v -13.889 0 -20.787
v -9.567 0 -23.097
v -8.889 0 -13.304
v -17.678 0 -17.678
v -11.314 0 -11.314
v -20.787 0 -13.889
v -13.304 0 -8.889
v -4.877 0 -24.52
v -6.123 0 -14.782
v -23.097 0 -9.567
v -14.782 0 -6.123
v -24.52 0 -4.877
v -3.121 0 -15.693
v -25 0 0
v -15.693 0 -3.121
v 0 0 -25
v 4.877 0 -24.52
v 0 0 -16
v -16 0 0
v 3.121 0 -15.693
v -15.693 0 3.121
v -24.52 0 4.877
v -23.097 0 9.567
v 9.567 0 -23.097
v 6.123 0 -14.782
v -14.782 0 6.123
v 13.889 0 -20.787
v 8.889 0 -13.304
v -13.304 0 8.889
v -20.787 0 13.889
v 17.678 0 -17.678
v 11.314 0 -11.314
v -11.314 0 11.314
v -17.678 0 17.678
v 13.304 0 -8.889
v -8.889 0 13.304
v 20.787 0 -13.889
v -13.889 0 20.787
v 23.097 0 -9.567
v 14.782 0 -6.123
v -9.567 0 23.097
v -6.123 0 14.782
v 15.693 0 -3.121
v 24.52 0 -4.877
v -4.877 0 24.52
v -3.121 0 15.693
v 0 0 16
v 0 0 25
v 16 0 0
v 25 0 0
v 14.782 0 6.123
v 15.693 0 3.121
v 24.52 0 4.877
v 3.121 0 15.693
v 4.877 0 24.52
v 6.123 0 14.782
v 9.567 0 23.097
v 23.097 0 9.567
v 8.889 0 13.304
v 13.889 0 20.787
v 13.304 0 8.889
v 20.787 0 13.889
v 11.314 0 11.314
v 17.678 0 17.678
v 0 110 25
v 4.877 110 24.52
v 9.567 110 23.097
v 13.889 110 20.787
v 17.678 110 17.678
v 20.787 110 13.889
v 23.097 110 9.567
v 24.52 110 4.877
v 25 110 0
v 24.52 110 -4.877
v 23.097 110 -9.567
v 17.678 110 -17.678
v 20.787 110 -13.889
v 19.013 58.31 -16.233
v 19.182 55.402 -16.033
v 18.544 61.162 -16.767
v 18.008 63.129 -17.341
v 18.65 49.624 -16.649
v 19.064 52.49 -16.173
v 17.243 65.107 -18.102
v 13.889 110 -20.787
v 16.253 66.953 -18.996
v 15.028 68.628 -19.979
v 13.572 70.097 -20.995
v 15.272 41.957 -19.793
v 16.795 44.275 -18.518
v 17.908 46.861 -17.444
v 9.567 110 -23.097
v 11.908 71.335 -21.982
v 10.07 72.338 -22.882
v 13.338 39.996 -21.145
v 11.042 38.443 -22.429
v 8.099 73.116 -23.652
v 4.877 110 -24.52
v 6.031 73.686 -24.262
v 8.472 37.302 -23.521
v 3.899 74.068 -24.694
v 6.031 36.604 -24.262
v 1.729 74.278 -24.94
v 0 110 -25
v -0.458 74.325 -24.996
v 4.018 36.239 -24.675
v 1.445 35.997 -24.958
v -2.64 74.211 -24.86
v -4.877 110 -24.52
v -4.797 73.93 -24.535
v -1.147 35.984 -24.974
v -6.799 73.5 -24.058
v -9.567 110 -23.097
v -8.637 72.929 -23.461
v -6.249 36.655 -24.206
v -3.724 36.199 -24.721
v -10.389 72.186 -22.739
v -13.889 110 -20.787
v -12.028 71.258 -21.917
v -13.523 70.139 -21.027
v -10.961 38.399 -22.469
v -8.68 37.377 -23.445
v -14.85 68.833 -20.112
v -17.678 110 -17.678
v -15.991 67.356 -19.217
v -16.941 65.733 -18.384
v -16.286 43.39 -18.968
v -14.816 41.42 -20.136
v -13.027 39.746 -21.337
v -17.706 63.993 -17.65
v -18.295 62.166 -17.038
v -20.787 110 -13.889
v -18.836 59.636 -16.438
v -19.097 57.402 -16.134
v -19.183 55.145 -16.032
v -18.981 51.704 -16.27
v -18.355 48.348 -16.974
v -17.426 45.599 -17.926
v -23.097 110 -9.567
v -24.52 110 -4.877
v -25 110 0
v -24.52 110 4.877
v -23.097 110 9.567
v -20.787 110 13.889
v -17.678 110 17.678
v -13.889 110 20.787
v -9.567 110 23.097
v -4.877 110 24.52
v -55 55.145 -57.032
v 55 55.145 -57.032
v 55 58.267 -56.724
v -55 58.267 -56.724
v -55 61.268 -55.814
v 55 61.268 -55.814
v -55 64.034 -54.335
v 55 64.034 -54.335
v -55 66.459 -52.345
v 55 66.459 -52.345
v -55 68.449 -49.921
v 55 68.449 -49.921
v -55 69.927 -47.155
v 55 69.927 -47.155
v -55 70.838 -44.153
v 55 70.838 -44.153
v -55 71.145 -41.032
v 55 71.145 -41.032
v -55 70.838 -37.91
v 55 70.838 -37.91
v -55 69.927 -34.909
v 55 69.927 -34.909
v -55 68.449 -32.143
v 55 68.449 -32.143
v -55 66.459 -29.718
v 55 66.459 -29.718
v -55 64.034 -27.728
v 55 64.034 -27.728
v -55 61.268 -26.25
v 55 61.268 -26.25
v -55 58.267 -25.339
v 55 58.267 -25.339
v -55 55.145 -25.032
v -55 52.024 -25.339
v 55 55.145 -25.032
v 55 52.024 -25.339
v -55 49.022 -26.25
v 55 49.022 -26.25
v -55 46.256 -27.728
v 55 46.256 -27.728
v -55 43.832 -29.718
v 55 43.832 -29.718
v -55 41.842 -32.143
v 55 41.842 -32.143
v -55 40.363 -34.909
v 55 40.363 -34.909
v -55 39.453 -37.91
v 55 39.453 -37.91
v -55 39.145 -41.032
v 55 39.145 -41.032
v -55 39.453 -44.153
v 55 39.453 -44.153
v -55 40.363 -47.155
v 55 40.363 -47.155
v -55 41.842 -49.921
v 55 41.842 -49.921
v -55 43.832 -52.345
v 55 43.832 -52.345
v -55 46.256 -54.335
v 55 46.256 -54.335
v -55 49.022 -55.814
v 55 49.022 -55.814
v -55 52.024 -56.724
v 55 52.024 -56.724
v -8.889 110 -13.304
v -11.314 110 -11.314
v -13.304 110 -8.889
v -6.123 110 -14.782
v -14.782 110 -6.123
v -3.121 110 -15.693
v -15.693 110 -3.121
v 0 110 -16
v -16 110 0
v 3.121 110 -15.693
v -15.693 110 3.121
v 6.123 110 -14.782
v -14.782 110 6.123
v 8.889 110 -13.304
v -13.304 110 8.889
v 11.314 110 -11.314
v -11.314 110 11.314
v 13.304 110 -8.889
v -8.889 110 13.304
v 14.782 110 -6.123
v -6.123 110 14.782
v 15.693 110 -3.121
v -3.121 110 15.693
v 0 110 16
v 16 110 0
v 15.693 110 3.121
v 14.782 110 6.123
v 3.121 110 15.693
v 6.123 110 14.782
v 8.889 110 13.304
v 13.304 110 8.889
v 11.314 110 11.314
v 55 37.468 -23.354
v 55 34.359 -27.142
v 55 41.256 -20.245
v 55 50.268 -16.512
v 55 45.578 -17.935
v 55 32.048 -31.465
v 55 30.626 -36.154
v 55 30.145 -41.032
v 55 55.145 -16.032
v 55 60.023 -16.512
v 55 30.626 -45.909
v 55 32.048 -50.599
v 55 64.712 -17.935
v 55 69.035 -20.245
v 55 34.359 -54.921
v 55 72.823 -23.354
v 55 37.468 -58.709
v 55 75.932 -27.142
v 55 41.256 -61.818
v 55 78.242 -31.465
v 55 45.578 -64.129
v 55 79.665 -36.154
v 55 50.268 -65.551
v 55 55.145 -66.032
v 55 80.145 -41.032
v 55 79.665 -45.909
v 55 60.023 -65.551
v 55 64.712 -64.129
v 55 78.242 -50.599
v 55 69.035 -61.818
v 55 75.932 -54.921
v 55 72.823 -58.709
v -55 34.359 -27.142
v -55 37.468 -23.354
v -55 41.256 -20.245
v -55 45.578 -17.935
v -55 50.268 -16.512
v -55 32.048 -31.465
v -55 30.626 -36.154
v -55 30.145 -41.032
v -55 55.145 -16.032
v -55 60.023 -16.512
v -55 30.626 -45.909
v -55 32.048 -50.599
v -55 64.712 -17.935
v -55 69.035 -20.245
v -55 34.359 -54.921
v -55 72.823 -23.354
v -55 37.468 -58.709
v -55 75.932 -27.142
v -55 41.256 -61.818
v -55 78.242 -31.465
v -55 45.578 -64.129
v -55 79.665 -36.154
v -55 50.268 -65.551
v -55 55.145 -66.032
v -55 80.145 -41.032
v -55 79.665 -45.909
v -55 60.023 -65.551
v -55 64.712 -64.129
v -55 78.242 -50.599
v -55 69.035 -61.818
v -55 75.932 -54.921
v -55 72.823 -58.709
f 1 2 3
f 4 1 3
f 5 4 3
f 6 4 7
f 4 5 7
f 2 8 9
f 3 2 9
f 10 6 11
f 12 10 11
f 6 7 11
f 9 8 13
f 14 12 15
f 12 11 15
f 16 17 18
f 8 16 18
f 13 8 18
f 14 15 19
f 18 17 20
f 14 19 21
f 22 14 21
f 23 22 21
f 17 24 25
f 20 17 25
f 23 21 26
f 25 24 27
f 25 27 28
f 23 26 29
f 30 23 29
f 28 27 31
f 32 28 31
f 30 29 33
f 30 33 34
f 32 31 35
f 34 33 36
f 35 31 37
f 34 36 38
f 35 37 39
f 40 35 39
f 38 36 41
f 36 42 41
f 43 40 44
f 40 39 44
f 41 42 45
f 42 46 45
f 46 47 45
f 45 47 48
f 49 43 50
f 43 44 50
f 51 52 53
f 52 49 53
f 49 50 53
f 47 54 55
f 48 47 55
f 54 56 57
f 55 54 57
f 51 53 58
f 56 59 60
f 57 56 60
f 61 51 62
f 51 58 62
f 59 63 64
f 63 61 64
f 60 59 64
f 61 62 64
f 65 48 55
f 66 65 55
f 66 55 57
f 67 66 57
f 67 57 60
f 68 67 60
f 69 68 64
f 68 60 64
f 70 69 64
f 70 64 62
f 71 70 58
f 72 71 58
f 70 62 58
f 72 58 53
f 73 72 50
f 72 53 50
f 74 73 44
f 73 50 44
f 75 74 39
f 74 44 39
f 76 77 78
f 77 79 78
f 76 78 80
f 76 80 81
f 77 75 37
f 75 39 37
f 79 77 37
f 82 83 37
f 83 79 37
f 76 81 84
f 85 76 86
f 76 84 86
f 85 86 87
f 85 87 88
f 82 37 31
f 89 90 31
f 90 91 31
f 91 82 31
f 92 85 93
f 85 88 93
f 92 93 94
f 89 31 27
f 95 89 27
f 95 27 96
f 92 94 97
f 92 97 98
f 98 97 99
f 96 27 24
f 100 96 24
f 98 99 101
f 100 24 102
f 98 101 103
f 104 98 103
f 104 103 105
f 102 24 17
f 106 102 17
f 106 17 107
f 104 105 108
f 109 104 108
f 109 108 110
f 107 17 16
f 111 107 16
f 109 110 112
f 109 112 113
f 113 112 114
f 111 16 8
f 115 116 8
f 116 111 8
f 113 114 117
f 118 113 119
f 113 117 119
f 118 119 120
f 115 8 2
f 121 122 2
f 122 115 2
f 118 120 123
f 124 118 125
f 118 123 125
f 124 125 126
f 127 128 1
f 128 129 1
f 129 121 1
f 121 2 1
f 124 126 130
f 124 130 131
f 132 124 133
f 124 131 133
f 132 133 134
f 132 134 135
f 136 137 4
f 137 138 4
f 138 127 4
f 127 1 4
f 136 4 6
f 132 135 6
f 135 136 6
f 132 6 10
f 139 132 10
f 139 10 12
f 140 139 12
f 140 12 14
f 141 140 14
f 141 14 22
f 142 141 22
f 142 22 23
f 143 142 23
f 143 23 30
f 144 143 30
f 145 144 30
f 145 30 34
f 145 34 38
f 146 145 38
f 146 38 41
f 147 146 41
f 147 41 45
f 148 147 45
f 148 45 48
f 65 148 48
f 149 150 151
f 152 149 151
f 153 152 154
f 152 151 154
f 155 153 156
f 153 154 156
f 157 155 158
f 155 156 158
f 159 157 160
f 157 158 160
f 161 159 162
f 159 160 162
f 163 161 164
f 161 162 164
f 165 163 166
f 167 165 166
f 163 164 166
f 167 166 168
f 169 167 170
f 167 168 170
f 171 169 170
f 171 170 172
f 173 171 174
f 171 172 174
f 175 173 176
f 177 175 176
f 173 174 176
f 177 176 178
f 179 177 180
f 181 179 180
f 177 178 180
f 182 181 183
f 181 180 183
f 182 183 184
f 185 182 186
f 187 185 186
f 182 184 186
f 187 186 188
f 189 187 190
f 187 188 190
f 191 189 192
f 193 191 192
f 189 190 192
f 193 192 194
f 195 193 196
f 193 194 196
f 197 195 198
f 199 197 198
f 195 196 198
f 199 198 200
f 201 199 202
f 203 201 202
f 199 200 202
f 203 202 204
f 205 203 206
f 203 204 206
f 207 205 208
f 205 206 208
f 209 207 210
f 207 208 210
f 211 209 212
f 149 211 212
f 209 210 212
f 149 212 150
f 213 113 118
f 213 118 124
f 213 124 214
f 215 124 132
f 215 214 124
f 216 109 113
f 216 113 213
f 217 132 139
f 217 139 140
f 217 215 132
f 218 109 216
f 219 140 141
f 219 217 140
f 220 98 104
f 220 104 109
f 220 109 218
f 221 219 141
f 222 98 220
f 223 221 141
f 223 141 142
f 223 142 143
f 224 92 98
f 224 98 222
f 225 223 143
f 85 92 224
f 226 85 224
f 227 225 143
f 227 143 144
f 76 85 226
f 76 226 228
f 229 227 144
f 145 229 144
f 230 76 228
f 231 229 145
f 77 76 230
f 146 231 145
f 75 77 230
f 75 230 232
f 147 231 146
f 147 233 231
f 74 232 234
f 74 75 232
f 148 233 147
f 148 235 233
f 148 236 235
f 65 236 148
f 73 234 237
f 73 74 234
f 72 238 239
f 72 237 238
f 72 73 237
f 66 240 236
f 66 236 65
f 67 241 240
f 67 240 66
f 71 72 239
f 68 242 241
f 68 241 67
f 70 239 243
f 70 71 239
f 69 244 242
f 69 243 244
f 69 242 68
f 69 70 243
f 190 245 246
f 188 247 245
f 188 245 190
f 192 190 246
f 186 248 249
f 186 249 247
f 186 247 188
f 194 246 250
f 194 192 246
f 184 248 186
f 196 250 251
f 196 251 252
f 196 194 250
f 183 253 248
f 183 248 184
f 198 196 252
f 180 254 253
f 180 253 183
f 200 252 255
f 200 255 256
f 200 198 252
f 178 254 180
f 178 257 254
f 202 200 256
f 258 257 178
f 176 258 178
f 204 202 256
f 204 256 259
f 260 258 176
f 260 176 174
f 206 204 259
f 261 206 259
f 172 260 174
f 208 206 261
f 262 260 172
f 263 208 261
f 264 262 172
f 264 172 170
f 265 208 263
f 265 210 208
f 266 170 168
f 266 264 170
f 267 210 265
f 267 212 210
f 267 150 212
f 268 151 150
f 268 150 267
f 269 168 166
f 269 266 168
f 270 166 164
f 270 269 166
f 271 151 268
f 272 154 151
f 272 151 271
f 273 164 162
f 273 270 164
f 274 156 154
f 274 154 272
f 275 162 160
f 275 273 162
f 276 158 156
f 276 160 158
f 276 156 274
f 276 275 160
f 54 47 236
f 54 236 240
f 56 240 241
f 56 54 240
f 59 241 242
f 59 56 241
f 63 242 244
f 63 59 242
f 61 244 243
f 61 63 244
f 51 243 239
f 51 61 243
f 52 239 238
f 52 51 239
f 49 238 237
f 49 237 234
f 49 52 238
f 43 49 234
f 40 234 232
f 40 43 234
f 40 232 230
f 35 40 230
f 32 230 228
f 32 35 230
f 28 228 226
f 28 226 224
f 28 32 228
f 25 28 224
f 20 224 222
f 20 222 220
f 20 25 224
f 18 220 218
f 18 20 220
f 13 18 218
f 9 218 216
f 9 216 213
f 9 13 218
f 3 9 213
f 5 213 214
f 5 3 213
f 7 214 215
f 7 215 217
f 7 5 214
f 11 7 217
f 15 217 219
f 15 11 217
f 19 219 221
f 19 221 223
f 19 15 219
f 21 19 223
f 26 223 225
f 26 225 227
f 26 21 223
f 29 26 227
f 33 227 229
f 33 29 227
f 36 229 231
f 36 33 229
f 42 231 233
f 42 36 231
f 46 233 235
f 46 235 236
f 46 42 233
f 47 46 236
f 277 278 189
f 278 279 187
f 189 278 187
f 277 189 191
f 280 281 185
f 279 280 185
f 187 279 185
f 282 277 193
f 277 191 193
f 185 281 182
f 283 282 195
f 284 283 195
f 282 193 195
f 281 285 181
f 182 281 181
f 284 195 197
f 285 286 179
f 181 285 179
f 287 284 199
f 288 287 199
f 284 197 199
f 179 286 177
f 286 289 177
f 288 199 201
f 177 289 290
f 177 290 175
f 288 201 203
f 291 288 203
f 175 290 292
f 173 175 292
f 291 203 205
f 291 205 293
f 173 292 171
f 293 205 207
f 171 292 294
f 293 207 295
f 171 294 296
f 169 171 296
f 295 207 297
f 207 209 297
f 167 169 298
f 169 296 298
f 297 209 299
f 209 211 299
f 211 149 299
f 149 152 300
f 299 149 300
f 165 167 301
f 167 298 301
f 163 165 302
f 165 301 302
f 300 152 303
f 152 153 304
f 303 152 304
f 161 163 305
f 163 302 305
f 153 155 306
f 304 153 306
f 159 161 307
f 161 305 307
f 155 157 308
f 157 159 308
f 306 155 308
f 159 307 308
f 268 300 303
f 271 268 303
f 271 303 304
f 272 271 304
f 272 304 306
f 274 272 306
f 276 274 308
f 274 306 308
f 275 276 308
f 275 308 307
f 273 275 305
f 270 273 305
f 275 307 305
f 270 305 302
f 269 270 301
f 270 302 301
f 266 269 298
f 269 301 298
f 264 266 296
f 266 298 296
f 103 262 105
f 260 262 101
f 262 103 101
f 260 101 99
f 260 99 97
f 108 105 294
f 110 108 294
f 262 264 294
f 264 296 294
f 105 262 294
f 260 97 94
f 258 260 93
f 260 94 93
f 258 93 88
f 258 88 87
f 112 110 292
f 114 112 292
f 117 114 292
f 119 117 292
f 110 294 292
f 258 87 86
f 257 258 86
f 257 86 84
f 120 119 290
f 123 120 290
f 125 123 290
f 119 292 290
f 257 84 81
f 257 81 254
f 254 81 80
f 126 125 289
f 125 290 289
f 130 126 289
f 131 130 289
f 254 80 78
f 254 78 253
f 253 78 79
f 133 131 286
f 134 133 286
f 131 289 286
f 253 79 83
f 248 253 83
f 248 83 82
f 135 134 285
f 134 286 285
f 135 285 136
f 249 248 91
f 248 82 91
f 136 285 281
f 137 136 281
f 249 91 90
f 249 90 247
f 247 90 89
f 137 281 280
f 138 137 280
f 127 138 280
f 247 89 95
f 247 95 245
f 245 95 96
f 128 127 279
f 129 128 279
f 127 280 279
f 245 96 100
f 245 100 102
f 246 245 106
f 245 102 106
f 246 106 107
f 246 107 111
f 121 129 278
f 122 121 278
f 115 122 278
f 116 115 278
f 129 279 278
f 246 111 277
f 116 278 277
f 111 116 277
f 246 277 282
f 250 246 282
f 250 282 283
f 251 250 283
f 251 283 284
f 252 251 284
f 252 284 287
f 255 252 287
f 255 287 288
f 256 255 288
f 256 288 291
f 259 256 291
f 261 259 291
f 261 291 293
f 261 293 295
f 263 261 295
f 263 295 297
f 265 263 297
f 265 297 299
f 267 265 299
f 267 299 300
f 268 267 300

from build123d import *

# Parameters (mm, degrees)
SKETCH2_R                = 25
SKETCH2_R_2              = 16
BOSS_EXTRUDE1_DEPTH      = 110
BOSS_EXTRUDE3_DEPTH      = 55
BOSS_EXTRUDE3_DEPTH_BACK = 55
SKETCH3_R                = 25
SKETCH5_R                = 16
CUT_EXTRUDE2_DEPTH       = 110


with BuildPart() as part:
    # Sketch2 → Boss-Extrude1 (new body)
    with BuildSketch(Plane(origin=(0, 0, 0), x_dir=(1, 0, 0), z_dir=(0, 1, 0))):
        Circle(SKETCH2_R)
        Circle(SKETCH2_R_2, mode=Mode.SUBTRACT)
    extrude(amount=BOSS_EXTRUDE1_DEPTH)

    # Sketch3 → Boss-Extrude3 (add, two sides: drawn at the far end of the back side and taken through both)
    with BuildSketch(Plane(origin=(0, 0, 0), x_dir=(0, 0, -1), z_dir=(1, 0, 0)).offset(-BOSS_EXTRUDE3_DEPTH_BACK)):
        with Locations((41.031680292, 55.145345171)):
            Circle(SKETCH3_R)
    extrude(amount=BOSS_EXTRUDE3_DEPTH + BOSS_EXTRUDE3_DEPTH_BACK)

    # Sketch5 → Cut-Extrude2 (cut)
    with BuildSketch(Plane(origin=(55, 0, 0), x_dir=(0, 0, -1), z_dir=(1, 0, 0))):
        with Locations((41.031680292, 55.145345171)):
            Circle(SKETCH5_R)
    extrude(amount=-CUT_EXTRUDE2_DEPTH, mode=Mode.SUBTRACT)


solid = part.part
